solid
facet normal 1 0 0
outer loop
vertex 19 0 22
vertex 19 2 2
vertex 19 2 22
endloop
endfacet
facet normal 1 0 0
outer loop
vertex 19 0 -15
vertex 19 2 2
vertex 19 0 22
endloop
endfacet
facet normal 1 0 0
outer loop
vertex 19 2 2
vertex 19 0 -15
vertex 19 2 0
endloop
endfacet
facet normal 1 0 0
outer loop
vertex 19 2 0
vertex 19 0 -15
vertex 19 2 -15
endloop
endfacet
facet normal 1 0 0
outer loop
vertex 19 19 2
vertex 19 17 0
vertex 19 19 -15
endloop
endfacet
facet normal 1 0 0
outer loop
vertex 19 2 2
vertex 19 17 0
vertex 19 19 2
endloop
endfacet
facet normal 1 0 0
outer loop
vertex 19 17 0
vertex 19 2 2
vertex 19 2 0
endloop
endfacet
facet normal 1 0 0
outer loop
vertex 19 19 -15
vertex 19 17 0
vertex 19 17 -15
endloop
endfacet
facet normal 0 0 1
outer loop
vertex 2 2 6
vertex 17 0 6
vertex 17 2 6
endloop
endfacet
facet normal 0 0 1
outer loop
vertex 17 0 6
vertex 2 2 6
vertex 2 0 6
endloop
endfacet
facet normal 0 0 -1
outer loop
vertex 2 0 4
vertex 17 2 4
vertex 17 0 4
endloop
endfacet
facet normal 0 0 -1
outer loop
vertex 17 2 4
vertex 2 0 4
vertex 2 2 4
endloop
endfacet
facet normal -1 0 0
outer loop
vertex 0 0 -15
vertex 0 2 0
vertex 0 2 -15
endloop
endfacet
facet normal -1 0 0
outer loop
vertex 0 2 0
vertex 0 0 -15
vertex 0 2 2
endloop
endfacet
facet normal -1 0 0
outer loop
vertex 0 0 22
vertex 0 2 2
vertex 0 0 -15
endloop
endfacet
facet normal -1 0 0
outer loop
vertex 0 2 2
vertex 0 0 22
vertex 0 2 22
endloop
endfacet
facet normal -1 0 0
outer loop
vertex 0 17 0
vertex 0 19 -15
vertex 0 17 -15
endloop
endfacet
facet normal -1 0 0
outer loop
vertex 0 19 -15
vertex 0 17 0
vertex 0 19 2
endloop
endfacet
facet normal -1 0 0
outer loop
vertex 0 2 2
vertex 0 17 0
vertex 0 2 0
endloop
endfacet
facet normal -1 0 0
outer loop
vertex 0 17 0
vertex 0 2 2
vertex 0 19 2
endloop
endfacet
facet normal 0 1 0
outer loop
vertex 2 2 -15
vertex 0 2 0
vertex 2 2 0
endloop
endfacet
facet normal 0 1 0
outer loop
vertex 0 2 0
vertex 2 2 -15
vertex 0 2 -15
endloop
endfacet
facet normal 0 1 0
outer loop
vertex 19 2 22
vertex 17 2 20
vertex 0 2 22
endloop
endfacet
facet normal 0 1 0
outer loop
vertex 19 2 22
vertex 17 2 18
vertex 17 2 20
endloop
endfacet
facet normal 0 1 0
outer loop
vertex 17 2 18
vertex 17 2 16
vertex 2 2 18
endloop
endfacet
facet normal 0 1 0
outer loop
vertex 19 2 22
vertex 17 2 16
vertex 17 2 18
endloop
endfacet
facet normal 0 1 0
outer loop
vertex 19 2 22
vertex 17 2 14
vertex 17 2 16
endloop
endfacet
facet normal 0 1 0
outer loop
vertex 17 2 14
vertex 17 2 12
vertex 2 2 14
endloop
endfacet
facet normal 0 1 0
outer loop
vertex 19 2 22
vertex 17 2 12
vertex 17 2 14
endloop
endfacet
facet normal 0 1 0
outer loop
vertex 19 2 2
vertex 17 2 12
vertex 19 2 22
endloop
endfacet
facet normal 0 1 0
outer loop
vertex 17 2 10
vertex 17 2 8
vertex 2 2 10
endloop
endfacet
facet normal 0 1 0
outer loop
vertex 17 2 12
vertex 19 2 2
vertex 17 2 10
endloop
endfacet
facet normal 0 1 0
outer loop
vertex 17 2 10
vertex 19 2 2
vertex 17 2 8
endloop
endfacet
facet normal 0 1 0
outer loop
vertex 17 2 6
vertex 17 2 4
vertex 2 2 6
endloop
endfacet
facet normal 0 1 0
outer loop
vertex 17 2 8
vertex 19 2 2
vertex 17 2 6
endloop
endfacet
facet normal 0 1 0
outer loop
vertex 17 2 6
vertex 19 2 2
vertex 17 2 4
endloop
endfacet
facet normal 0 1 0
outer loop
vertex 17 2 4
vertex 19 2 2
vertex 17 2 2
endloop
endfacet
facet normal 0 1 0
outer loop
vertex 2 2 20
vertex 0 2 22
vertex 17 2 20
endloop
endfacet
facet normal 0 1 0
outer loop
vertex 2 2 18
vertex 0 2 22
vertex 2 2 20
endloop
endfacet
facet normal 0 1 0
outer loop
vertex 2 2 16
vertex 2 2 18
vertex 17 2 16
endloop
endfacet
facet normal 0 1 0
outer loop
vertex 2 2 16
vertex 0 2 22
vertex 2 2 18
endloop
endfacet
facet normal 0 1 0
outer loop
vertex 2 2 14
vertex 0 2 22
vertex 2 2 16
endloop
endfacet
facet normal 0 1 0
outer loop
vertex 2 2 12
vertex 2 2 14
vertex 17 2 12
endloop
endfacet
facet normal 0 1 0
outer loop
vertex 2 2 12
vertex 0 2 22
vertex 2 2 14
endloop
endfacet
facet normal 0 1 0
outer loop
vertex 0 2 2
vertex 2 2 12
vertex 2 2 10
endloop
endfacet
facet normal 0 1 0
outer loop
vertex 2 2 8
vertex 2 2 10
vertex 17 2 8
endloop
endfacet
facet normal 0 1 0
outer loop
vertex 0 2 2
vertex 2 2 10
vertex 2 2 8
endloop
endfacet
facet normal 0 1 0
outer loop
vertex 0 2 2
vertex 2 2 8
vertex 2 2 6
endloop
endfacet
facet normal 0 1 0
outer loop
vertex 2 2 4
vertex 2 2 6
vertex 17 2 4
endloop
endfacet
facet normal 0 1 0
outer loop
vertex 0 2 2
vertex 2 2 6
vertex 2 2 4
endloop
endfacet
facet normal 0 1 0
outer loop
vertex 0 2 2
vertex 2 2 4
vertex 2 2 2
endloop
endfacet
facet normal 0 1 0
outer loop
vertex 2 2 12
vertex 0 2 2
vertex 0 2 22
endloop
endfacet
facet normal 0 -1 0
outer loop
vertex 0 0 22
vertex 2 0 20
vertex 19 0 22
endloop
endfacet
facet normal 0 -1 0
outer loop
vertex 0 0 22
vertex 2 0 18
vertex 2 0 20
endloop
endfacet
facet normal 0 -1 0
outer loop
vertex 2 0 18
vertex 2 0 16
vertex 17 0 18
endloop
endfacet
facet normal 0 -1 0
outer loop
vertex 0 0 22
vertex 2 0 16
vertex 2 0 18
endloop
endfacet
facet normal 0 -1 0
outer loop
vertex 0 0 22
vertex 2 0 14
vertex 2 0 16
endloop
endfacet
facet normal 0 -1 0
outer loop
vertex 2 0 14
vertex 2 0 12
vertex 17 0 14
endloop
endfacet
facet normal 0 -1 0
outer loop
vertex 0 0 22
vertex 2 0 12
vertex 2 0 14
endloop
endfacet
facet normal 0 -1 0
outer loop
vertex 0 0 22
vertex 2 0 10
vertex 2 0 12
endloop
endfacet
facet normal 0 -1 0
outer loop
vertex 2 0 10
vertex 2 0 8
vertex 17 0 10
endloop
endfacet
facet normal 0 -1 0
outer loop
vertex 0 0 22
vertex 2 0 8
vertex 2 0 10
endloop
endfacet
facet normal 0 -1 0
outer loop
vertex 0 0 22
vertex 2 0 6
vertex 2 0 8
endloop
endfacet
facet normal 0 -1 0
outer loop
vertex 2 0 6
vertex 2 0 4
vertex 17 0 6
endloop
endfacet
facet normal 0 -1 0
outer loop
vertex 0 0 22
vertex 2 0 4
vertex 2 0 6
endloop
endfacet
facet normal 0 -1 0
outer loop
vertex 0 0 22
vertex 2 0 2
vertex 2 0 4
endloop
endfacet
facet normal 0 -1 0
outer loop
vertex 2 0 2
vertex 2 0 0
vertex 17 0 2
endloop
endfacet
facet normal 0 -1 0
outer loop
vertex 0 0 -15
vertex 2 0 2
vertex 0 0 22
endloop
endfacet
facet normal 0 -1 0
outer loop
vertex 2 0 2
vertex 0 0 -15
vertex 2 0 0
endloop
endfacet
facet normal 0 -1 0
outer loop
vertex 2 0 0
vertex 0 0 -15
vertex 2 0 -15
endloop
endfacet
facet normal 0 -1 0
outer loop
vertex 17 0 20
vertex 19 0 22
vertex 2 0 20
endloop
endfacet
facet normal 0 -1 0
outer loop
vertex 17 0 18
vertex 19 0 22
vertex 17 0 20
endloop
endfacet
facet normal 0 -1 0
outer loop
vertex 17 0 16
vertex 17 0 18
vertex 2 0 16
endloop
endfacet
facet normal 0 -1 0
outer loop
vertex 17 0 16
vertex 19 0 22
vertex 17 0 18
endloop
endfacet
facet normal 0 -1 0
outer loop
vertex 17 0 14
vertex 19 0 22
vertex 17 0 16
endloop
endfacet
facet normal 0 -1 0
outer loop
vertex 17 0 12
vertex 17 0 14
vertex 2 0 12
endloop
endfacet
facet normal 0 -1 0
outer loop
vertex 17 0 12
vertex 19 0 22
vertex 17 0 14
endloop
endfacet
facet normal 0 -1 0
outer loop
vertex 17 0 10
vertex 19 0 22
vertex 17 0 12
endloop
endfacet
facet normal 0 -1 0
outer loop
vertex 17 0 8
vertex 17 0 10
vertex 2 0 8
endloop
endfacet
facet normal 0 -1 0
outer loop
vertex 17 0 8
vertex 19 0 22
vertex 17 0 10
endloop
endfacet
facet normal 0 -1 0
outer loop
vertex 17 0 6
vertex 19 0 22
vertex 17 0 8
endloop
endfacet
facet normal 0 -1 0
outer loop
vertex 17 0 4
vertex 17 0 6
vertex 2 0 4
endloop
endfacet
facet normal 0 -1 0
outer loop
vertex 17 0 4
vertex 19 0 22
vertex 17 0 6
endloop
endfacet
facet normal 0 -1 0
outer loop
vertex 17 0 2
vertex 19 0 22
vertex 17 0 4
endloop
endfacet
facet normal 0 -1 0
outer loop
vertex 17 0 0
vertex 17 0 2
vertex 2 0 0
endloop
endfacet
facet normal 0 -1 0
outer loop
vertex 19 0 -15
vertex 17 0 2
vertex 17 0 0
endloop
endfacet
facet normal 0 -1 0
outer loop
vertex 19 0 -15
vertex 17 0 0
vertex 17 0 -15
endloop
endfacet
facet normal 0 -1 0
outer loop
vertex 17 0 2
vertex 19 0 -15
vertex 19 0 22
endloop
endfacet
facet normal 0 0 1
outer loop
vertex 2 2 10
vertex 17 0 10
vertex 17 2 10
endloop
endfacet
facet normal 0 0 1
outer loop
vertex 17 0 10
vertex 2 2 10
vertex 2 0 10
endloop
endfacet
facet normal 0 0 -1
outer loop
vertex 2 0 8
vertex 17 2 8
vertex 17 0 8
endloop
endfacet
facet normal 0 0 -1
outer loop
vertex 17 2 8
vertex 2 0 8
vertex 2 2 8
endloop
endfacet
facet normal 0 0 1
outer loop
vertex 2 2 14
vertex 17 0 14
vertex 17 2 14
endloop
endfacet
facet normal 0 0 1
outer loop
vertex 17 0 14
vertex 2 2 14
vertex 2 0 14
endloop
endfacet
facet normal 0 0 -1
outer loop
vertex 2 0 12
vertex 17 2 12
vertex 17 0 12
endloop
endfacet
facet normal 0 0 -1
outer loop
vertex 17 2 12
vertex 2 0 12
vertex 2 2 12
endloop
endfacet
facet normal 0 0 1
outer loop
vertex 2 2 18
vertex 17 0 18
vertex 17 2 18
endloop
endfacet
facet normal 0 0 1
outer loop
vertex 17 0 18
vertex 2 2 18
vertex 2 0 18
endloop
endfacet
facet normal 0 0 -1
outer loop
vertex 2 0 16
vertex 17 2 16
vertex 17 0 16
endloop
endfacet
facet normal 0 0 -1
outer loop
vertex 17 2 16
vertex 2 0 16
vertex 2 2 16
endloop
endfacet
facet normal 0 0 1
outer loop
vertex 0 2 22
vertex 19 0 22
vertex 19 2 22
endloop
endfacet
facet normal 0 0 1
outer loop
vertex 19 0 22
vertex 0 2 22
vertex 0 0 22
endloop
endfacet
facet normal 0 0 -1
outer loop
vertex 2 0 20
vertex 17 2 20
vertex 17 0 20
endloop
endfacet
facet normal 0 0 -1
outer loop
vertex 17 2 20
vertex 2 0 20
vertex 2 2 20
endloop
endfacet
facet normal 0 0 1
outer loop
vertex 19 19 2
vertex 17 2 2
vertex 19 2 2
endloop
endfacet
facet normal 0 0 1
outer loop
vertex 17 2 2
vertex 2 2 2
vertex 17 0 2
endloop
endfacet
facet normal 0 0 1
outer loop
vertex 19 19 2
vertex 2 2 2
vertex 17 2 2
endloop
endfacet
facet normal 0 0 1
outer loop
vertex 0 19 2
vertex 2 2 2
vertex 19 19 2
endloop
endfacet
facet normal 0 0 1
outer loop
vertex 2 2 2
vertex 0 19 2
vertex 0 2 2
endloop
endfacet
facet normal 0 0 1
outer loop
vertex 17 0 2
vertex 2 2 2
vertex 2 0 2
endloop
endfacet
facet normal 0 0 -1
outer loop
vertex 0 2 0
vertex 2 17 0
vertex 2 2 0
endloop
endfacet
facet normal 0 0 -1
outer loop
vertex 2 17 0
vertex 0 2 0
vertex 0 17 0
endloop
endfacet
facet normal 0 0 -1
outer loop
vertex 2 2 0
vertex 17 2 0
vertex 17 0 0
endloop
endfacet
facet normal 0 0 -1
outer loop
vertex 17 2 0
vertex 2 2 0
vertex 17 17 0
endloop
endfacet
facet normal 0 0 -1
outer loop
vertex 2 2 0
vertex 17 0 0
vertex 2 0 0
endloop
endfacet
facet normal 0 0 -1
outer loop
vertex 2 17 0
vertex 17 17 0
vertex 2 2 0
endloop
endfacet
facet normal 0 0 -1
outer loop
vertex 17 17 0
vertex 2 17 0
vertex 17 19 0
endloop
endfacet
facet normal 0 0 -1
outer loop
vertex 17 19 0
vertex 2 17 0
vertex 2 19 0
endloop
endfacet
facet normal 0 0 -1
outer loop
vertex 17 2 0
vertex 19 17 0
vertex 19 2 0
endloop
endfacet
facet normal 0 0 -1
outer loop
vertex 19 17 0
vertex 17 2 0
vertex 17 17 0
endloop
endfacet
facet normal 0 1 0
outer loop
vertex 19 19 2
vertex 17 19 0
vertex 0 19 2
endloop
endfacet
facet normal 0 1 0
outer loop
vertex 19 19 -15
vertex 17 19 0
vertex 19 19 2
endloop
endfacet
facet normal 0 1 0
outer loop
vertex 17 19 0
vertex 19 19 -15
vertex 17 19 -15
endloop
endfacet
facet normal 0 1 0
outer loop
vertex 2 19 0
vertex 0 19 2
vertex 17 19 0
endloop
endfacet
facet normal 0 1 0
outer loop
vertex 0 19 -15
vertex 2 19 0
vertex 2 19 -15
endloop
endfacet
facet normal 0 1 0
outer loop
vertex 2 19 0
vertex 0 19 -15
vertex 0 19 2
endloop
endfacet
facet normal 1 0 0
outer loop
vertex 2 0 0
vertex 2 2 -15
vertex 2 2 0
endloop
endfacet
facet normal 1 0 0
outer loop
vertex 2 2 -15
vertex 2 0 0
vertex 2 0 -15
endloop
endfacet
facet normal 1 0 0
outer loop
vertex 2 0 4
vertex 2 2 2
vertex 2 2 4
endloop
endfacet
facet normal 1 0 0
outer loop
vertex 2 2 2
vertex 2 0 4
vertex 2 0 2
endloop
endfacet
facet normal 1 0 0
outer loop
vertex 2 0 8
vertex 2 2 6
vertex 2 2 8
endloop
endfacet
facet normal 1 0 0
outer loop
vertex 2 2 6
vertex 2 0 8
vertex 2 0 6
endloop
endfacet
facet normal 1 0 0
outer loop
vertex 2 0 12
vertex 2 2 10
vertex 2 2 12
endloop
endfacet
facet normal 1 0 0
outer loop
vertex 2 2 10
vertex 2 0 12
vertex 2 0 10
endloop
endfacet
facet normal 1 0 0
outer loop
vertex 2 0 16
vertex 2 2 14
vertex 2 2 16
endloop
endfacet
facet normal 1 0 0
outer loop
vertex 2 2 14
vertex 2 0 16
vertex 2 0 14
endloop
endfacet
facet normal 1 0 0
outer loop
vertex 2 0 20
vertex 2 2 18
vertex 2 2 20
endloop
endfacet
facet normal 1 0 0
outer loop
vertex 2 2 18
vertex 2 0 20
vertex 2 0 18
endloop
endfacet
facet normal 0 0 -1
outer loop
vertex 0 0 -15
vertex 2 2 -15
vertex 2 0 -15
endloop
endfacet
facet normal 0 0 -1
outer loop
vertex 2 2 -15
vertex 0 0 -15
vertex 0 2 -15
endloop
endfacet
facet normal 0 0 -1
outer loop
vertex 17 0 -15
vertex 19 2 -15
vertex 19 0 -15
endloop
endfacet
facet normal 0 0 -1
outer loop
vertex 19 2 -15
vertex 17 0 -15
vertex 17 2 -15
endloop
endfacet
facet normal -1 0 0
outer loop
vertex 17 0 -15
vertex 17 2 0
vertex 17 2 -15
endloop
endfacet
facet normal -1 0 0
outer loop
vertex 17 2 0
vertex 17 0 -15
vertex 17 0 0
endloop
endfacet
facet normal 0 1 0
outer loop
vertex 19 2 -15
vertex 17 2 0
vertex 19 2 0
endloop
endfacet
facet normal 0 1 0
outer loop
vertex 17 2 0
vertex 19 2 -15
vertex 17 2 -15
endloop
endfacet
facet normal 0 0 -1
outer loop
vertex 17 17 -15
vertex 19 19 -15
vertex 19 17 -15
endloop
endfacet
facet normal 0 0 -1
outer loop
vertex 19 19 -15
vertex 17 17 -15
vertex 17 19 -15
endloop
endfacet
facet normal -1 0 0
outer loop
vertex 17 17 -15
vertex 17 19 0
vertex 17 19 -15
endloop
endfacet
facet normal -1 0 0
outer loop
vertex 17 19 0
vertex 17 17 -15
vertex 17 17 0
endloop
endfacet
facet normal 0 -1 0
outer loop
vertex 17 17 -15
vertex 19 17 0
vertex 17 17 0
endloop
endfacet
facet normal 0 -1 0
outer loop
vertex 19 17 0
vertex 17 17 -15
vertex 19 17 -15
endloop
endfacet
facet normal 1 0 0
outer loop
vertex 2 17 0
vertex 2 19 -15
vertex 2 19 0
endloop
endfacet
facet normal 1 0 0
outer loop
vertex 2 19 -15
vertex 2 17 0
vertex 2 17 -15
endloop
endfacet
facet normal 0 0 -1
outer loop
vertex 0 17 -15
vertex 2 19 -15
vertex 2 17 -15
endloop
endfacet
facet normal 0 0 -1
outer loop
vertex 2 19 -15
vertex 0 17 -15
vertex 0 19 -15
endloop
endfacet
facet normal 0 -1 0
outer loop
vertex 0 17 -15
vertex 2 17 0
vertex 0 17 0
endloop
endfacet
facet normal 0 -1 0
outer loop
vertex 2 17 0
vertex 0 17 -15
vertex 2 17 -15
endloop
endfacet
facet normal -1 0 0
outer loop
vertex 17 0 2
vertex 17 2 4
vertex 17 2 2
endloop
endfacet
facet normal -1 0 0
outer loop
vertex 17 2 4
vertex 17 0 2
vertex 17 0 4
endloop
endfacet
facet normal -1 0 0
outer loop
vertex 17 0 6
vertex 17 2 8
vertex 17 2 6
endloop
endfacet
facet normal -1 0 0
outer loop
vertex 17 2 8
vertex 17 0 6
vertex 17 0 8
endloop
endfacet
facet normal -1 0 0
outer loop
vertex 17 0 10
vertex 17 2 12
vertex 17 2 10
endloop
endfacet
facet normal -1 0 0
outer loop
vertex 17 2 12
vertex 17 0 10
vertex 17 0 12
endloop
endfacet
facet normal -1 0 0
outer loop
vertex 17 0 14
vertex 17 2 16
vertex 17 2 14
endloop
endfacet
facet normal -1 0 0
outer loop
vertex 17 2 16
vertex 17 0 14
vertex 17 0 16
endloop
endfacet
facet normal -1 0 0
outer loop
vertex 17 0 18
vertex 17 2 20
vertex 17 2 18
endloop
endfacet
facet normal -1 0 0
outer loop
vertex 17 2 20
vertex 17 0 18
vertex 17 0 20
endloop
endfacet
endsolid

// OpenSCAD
// #import( "chair.stl" );

/**
 * Chair
 * Model jednoduché židle s opěradlem složeným z příček.
 * Opěradlo je pro uznání nutné dělat forcykly!
 * @param rung_number Počet příček
 * @param x seat_width Šířka čtvercového sedáku (zároveň i délka)
 * @param x seat_thickness Tloušťka sedáku
 * @param feet_width Tloušťka nohou i příček
 * @param feet_length Délka nohou židle. Musí být počítáno od spodní strany sedáku!
 * @author Marek Žehra
 */
 
module chair(
rung_number=5,
seat_width=19,
seat_thickness=2,
feet_width=2,
feet_length=15
) {
  //= Seat
  cube( [ seat_width, seat_width, seat_thickness ] );
  
  //= Chair feets
  translate( [0,0, - feet_length] )
    cube( [feet_width, feet_width, feet_length] );
  translate( [seat_width - feet_width,0, - feet_length] )
    cube( [feet_width, feet_width, feet_length] );
  translate( [seat_width - feet_width,seat_width - feet_width, - feet_length] )
    cube( [feet_width, feet_width, feet_length] );
  translate( [0,seat_width - feet_width, - feet_length] )
    cube( [feet_width, feet_width, feet_length] );
  
  //= Rungs
  for( p=[0:2:(rung_number*2) -1] ) {
    translate( [0, 0, seat_thickness + (p+1)*feet_width] ) 
      cube( [seat_width, feet_width, feet_width ] );
  }
  
  // Top rung
  cube( [feet_width, feet_width, seat_thickness + ( 2 *rung_number * feet_width ) ] );

  translate([ seat_width - feet_width, 0, 0 ])
    cube( [feet_width, feet_width, seat_thickness + ( 2 *rung_number * feet_width ) ] );
   
}

chair();
